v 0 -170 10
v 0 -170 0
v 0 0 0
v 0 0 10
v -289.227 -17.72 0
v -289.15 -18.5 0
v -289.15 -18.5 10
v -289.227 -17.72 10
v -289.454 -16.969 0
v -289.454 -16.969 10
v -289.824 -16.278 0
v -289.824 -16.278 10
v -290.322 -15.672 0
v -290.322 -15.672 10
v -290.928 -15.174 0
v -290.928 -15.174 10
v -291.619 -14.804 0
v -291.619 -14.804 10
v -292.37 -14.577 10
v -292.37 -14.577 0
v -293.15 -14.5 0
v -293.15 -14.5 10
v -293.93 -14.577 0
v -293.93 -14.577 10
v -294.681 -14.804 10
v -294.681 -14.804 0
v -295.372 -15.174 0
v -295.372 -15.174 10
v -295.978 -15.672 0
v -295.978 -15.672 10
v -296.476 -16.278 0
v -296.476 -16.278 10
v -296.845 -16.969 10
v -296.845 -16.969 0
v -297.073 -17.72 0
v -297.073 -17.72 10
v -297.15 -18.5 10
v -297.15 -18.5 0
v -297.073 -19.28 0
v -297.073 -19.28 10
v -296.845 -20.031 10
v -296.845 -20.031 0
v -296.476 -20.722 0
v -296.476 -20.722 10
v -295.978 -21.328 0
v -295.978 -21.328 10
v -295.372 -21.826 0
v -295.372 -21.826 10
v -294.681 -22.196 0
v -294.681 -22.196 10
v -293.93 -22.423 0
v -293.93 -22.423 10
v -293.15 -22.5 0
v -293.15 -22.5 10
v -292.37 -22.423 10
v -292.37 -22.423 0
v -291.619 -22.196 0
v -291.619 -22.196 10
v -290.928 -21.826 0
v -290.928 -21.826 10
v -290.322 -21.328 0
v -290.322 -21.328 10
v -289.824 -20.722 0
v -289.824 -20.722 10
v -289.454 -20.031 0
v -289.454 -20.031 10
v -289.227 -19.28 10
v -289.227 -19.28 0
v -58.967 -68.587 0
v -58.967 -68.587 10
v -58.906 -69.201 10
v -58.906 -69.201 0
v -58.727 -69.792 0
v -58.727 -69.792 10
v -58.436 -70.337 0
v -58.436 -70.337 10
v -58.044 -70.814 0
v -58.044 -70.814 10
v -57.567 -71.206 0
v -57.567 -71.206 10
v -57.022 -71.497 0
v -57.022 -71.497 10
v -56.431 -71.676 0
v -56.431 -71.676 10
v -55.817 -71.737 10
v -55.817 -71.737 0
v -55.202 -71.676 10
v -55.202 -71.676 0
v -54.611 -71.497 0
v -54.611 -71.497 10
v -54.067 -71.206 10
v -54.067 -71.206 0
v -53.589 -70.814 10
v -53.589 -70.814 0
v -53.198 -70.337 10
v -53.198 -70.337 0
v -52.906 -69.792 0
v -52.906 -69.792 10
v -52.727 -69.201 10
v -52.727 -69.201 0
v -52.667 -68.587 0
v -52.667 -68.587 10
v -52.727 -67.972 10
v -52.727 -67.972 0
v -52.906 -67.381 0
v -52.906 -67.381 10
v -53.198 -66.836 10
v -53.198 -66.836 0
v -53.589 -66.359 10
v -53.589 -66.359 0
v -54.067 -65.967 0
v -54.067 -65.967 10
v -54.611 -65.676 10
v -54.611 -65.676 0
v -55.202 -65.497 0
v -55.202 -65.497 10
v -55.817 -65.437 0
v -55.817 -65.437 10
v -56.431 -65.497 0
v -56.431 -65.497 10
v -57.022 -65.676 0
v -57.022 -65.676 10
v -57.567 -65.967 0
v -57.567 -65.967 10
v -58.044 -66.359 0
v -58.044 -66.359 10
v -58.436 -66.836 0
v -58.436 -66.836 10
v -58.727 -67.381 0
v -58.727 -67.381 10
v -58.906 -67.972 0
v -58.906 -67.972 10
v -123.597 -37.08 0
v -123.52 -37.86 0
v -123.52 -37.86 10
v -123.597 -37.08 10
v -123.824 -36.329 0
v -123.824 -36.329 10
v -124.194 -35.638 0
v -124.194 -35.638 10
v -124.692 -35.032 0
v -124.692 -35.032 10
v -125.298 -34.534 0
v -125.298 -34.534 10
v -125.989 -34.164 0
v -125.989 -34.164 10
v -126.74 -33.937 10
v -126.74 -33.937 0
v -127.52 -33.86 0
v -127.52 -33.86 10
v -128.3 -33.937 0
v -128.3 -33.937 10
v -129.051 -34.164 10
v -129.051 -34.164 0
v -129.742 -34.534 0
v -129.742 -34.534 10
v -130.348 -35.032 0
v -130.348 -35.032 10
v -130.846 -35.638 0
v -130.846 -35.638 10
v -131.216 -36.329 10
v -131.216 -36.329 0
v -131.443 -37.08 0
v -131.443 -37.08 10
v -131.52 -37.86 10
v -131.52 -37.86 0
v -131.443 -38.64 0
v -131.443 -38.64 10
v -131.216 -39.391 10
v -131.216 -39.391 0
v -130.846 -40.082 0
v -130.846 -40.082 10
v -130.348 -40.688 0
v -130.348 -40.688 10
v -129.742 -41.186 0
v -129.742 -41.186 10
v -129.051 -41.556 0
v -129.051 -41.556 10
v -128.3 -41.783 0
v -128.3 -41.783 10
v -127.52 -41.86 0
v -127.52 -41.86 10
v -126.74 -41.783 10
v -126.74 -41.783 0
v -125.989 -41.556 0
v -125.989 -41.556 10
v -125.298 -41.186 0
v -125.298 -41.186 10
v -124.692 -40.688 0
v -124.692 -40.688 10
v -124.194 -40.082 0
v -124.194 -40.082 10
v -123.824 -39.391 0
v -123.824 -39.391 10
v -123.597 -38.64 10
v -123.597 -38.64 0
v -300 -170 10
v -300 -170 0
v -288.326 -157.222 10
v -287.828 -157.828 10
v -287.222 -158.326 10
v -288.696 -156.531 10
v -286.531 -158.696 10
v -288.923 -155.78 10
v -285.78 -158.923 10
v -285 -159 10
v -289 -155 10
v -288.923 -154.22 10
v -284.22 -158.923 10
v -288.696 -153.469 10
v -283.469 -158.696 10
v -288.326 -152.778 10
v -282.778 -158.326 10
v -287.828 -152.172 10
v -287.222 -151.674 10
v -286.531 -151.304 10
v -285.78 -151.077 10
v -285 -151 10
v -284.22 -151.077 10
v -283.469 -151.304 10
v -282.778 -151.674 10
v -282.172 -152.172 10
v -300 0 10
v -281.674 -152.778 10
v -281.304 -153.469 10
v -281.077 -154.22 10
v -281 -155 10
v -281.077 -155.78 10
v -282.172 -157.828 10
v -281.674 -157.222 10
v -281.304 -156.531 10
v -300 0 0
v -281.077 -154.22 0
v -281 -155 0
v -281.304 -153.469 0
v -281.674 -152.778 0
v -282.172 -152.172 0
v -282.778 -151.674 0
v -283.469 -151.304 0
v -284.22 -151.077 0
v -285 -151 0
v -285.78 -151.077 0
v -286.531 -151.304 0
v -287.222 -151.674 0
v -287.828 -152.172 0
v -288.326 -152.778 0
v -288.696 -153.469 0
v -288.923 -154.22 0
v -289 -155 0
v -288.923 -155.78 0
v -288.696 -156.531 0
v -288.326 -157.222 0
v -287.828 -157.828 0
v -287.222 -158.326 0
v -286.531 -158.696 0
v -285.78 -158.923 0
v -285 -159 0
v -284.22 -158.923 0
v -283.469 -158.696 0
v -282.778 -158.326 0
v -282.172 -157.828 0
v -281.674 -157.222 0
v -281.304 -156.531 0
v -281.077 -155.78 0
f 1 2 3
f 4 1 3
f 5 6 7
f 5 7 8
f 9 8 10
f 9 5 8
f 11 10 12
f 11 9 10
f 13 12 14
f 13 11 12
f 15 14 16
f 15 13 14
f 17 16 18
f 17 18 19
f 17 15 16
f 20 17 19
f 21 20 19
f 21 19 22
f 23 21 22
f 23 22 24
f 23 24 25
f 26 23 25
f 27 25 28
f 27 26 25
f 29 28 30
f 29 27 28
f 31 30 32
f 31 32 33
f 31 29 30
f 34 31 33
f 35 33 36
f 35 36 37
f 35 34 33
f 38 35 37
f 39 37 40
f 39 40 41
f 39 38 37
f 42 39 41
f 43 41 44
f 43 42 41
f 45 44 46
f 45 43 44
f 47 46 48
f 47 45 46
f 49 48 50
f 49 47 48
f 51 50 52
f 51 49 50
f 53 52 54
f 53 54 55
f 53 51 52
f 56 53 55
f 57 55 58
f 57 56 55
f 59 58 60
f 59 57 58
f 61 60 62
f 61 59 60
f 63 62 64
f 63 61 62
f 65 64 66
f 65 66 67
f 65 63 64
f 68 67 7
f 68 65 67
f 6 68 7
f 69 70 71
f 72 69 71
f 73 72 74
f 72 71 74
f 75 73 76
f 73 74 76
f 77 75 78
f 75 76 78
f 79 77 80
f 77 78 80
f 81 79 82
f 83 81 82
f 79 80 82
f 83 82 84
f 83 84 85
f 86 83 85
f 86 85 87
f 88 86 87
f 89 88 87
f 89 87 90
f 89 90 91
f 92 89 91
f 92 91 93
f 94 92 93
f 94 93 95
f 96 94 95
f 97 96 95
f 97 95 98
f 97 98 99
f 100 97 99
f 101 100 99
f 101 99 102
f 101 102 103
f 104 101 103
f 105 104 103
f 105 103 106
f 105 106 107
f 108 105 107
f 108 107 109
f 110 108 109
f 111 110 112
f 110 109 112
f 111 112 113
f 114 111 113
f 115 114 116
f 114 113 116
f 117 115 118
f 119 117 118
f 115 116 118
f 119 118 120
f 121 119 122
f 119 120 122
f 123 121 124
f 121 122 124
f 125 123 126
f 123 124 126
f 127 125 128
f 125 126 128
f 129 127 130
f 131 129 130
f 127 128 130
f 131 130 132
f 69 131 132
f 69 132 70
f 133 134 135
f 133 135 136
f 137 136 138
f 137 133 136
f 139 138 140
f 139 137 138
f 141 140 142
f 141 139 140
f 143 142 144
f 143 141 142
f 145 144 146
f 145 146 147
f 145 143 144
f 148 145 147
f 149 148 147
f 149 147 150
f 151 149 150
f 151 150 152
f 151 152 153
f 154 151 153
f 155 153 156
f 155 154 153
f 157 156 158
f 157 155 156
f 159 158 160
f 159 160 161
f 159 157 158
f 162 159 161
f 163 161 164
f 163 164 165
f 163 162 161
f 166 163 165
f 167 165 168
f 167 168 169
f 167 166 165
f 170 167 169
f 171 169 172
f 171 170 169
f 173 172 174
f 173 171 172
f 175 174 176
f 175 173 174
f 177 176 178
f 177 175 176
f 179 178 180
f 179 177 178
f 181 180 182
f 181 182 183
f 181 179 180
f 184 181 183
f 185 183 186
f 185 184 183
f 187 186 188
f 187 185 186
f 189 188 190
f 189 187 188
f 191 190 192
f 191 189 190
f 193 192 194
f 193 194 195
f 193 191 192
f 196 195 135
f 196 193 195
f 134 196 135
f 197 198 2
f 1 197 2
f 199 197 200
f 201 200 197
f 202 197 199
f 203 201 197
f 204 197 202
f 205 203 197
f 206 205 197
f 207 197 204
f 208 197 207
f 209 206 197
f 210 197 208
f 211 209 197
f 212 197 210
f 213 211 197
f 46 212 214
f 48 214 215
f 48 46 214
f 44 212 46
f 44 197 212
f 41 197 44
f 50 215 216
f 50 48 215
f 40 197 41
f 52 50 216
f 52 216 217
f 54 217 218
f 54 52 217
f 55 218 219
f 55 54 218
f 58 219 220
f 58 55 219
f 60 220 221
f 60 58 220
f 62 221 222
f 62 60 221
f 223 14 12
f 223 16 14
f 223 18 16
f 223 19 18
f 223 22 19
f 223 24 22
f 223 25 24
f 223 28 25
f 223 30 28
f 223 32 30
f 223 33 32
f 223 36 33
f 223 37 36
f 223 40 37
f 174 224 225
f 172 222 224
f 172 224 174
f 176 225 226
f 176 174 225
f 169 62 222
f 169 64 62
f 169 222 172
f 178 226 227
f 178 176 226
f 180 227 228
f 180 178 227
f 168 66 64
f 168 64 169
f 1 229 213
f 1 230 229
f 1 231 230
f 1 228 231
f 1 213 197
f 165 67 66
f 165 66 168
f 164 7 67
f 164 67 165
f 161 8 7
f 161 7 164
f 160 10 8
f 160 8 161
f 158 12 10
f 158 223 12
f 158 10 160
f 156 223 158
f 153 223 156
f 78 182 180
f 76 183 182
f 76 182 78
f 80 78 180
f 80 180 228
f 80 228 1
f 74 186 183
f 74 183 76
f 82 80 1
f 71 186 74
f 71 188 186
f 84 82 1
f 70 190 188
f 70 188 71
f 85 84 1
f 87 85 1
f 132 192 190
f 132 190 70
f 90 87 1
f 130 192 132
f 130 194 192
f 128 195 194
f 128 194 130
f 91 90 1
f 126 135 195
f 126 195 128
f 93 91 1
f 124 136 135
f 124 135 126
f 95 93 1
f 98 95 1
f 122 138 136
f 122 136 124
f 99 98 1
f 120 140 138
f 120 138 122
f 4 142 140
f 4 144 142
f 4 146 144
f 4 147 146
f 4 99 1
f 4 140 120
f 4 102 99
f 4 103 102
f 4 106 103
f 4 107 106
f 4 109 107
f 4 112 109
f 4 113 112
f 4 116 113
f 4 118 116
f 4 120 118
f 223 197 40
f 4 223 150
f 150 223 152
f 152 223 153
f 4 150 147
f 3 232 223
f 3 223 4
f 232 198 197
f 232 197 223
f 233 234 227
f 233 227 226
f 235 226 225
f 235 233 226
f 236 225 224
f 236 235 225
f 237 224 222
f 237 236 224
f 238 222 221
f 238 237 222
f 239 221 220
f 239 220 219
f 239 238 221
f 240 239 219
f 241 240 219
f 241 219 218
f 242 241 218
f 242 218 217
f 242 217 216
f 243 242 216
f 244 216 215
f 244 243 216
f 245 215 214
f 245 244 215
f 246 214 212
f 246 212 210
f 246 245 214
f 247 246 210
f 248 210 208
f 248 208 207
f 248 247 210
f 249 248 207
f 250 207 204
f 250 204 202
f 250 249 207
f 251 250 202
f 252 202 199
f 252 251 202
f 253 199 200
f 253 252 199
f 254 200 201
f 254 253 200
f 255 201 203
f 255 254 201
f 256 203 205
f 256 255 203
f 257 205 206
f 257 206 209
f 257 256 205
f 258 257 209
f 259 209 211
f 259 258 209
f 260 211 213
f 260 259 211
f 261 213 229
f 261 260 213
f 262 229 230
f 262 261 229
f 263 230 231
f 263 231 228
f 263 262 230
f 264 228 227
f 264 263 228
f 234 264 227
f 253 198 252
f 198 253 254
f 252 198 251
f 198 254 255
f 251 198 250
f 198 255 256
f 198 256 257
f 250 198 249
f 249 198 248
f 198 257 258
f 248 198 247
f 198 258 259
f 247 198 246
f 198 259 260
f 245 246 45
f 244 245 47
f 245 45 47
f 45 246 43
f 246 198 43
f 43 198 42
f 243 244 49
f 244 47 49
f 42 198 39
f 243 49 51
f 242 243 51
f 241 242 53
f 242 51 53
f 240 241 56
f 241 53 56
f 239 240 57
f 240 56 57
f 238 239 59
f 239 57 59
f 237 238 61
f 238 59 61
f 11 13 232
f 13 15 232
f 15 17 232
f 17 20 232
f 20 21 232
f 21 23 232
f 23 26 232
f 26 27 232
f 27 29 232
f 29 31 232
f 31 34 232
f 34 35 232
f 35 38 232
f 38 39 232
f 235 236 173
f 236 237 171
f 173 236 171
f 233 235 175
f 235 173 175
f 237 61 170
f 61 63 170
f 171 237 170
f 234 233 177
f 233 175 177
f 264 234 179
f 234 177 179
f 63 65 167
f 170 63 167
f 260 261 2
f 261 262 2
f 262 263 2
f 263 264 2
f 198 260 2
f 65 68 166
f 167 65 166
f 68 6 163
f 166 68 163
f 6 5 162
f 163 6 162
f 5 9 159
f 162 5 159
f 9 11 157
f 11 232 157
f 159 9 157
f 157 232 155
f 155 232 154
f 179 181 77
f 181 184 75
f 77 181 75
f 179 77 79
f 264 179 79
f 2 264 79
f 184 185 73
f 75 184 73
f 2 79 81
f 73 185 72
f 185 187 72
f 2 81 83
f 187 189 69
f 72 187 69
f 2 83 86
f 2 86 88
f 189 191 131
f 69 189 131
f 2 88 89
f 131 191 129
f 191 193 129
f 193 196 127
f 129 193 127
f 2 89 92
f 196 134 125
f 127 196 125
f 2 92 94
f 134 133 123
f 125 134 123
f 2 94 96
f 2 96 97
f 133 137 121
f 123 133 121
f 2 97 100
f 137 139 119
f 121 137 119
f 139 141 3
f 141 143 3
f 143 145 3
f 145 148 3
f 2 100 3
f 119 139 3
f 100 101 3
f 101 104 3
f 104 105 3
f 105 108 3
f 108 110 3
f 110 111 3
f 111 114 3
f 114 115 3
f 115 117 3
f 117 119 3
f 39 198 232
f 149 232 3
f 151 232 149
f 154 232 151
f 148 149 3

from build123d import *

# Parameters (mm, degrees)
F0_W     = 300
F0_H     = 170
F0_R     = 4
F1_DEPTH = 10
F3_D     = 6.3


with BuildPart() as f1:
    # F0 (on Top) → F1 (new body)
    with BuildSketch(Plane.XY):
        with Locations((-150, -85)):
            Rectangle(F0_W, F0_H)
        with Locations((-285, -155)):
            Circle(F0_R, mode=Mode.SUBTRACT)
        with Locations((-293.1499779224, -18.4999983758)):
            Circle(F0_R, mode=Mode.SUBTRACT)
        with Locations((-127.52, -37.86)):
            Circle(F0_R, mode=Mode.SUBTRACT)
    extrude(amount=F1_DEPTH)

    # F3 (through all)
    with Locations(Plane(origin=(0, 0, 0), x_dir=(1, 0, 0), z_dir=(0, 0, -1))):
        with Locations((-55.8166801929, 68.5865059495)):
            Hole(F3_D / 2)


solid = f1.part
